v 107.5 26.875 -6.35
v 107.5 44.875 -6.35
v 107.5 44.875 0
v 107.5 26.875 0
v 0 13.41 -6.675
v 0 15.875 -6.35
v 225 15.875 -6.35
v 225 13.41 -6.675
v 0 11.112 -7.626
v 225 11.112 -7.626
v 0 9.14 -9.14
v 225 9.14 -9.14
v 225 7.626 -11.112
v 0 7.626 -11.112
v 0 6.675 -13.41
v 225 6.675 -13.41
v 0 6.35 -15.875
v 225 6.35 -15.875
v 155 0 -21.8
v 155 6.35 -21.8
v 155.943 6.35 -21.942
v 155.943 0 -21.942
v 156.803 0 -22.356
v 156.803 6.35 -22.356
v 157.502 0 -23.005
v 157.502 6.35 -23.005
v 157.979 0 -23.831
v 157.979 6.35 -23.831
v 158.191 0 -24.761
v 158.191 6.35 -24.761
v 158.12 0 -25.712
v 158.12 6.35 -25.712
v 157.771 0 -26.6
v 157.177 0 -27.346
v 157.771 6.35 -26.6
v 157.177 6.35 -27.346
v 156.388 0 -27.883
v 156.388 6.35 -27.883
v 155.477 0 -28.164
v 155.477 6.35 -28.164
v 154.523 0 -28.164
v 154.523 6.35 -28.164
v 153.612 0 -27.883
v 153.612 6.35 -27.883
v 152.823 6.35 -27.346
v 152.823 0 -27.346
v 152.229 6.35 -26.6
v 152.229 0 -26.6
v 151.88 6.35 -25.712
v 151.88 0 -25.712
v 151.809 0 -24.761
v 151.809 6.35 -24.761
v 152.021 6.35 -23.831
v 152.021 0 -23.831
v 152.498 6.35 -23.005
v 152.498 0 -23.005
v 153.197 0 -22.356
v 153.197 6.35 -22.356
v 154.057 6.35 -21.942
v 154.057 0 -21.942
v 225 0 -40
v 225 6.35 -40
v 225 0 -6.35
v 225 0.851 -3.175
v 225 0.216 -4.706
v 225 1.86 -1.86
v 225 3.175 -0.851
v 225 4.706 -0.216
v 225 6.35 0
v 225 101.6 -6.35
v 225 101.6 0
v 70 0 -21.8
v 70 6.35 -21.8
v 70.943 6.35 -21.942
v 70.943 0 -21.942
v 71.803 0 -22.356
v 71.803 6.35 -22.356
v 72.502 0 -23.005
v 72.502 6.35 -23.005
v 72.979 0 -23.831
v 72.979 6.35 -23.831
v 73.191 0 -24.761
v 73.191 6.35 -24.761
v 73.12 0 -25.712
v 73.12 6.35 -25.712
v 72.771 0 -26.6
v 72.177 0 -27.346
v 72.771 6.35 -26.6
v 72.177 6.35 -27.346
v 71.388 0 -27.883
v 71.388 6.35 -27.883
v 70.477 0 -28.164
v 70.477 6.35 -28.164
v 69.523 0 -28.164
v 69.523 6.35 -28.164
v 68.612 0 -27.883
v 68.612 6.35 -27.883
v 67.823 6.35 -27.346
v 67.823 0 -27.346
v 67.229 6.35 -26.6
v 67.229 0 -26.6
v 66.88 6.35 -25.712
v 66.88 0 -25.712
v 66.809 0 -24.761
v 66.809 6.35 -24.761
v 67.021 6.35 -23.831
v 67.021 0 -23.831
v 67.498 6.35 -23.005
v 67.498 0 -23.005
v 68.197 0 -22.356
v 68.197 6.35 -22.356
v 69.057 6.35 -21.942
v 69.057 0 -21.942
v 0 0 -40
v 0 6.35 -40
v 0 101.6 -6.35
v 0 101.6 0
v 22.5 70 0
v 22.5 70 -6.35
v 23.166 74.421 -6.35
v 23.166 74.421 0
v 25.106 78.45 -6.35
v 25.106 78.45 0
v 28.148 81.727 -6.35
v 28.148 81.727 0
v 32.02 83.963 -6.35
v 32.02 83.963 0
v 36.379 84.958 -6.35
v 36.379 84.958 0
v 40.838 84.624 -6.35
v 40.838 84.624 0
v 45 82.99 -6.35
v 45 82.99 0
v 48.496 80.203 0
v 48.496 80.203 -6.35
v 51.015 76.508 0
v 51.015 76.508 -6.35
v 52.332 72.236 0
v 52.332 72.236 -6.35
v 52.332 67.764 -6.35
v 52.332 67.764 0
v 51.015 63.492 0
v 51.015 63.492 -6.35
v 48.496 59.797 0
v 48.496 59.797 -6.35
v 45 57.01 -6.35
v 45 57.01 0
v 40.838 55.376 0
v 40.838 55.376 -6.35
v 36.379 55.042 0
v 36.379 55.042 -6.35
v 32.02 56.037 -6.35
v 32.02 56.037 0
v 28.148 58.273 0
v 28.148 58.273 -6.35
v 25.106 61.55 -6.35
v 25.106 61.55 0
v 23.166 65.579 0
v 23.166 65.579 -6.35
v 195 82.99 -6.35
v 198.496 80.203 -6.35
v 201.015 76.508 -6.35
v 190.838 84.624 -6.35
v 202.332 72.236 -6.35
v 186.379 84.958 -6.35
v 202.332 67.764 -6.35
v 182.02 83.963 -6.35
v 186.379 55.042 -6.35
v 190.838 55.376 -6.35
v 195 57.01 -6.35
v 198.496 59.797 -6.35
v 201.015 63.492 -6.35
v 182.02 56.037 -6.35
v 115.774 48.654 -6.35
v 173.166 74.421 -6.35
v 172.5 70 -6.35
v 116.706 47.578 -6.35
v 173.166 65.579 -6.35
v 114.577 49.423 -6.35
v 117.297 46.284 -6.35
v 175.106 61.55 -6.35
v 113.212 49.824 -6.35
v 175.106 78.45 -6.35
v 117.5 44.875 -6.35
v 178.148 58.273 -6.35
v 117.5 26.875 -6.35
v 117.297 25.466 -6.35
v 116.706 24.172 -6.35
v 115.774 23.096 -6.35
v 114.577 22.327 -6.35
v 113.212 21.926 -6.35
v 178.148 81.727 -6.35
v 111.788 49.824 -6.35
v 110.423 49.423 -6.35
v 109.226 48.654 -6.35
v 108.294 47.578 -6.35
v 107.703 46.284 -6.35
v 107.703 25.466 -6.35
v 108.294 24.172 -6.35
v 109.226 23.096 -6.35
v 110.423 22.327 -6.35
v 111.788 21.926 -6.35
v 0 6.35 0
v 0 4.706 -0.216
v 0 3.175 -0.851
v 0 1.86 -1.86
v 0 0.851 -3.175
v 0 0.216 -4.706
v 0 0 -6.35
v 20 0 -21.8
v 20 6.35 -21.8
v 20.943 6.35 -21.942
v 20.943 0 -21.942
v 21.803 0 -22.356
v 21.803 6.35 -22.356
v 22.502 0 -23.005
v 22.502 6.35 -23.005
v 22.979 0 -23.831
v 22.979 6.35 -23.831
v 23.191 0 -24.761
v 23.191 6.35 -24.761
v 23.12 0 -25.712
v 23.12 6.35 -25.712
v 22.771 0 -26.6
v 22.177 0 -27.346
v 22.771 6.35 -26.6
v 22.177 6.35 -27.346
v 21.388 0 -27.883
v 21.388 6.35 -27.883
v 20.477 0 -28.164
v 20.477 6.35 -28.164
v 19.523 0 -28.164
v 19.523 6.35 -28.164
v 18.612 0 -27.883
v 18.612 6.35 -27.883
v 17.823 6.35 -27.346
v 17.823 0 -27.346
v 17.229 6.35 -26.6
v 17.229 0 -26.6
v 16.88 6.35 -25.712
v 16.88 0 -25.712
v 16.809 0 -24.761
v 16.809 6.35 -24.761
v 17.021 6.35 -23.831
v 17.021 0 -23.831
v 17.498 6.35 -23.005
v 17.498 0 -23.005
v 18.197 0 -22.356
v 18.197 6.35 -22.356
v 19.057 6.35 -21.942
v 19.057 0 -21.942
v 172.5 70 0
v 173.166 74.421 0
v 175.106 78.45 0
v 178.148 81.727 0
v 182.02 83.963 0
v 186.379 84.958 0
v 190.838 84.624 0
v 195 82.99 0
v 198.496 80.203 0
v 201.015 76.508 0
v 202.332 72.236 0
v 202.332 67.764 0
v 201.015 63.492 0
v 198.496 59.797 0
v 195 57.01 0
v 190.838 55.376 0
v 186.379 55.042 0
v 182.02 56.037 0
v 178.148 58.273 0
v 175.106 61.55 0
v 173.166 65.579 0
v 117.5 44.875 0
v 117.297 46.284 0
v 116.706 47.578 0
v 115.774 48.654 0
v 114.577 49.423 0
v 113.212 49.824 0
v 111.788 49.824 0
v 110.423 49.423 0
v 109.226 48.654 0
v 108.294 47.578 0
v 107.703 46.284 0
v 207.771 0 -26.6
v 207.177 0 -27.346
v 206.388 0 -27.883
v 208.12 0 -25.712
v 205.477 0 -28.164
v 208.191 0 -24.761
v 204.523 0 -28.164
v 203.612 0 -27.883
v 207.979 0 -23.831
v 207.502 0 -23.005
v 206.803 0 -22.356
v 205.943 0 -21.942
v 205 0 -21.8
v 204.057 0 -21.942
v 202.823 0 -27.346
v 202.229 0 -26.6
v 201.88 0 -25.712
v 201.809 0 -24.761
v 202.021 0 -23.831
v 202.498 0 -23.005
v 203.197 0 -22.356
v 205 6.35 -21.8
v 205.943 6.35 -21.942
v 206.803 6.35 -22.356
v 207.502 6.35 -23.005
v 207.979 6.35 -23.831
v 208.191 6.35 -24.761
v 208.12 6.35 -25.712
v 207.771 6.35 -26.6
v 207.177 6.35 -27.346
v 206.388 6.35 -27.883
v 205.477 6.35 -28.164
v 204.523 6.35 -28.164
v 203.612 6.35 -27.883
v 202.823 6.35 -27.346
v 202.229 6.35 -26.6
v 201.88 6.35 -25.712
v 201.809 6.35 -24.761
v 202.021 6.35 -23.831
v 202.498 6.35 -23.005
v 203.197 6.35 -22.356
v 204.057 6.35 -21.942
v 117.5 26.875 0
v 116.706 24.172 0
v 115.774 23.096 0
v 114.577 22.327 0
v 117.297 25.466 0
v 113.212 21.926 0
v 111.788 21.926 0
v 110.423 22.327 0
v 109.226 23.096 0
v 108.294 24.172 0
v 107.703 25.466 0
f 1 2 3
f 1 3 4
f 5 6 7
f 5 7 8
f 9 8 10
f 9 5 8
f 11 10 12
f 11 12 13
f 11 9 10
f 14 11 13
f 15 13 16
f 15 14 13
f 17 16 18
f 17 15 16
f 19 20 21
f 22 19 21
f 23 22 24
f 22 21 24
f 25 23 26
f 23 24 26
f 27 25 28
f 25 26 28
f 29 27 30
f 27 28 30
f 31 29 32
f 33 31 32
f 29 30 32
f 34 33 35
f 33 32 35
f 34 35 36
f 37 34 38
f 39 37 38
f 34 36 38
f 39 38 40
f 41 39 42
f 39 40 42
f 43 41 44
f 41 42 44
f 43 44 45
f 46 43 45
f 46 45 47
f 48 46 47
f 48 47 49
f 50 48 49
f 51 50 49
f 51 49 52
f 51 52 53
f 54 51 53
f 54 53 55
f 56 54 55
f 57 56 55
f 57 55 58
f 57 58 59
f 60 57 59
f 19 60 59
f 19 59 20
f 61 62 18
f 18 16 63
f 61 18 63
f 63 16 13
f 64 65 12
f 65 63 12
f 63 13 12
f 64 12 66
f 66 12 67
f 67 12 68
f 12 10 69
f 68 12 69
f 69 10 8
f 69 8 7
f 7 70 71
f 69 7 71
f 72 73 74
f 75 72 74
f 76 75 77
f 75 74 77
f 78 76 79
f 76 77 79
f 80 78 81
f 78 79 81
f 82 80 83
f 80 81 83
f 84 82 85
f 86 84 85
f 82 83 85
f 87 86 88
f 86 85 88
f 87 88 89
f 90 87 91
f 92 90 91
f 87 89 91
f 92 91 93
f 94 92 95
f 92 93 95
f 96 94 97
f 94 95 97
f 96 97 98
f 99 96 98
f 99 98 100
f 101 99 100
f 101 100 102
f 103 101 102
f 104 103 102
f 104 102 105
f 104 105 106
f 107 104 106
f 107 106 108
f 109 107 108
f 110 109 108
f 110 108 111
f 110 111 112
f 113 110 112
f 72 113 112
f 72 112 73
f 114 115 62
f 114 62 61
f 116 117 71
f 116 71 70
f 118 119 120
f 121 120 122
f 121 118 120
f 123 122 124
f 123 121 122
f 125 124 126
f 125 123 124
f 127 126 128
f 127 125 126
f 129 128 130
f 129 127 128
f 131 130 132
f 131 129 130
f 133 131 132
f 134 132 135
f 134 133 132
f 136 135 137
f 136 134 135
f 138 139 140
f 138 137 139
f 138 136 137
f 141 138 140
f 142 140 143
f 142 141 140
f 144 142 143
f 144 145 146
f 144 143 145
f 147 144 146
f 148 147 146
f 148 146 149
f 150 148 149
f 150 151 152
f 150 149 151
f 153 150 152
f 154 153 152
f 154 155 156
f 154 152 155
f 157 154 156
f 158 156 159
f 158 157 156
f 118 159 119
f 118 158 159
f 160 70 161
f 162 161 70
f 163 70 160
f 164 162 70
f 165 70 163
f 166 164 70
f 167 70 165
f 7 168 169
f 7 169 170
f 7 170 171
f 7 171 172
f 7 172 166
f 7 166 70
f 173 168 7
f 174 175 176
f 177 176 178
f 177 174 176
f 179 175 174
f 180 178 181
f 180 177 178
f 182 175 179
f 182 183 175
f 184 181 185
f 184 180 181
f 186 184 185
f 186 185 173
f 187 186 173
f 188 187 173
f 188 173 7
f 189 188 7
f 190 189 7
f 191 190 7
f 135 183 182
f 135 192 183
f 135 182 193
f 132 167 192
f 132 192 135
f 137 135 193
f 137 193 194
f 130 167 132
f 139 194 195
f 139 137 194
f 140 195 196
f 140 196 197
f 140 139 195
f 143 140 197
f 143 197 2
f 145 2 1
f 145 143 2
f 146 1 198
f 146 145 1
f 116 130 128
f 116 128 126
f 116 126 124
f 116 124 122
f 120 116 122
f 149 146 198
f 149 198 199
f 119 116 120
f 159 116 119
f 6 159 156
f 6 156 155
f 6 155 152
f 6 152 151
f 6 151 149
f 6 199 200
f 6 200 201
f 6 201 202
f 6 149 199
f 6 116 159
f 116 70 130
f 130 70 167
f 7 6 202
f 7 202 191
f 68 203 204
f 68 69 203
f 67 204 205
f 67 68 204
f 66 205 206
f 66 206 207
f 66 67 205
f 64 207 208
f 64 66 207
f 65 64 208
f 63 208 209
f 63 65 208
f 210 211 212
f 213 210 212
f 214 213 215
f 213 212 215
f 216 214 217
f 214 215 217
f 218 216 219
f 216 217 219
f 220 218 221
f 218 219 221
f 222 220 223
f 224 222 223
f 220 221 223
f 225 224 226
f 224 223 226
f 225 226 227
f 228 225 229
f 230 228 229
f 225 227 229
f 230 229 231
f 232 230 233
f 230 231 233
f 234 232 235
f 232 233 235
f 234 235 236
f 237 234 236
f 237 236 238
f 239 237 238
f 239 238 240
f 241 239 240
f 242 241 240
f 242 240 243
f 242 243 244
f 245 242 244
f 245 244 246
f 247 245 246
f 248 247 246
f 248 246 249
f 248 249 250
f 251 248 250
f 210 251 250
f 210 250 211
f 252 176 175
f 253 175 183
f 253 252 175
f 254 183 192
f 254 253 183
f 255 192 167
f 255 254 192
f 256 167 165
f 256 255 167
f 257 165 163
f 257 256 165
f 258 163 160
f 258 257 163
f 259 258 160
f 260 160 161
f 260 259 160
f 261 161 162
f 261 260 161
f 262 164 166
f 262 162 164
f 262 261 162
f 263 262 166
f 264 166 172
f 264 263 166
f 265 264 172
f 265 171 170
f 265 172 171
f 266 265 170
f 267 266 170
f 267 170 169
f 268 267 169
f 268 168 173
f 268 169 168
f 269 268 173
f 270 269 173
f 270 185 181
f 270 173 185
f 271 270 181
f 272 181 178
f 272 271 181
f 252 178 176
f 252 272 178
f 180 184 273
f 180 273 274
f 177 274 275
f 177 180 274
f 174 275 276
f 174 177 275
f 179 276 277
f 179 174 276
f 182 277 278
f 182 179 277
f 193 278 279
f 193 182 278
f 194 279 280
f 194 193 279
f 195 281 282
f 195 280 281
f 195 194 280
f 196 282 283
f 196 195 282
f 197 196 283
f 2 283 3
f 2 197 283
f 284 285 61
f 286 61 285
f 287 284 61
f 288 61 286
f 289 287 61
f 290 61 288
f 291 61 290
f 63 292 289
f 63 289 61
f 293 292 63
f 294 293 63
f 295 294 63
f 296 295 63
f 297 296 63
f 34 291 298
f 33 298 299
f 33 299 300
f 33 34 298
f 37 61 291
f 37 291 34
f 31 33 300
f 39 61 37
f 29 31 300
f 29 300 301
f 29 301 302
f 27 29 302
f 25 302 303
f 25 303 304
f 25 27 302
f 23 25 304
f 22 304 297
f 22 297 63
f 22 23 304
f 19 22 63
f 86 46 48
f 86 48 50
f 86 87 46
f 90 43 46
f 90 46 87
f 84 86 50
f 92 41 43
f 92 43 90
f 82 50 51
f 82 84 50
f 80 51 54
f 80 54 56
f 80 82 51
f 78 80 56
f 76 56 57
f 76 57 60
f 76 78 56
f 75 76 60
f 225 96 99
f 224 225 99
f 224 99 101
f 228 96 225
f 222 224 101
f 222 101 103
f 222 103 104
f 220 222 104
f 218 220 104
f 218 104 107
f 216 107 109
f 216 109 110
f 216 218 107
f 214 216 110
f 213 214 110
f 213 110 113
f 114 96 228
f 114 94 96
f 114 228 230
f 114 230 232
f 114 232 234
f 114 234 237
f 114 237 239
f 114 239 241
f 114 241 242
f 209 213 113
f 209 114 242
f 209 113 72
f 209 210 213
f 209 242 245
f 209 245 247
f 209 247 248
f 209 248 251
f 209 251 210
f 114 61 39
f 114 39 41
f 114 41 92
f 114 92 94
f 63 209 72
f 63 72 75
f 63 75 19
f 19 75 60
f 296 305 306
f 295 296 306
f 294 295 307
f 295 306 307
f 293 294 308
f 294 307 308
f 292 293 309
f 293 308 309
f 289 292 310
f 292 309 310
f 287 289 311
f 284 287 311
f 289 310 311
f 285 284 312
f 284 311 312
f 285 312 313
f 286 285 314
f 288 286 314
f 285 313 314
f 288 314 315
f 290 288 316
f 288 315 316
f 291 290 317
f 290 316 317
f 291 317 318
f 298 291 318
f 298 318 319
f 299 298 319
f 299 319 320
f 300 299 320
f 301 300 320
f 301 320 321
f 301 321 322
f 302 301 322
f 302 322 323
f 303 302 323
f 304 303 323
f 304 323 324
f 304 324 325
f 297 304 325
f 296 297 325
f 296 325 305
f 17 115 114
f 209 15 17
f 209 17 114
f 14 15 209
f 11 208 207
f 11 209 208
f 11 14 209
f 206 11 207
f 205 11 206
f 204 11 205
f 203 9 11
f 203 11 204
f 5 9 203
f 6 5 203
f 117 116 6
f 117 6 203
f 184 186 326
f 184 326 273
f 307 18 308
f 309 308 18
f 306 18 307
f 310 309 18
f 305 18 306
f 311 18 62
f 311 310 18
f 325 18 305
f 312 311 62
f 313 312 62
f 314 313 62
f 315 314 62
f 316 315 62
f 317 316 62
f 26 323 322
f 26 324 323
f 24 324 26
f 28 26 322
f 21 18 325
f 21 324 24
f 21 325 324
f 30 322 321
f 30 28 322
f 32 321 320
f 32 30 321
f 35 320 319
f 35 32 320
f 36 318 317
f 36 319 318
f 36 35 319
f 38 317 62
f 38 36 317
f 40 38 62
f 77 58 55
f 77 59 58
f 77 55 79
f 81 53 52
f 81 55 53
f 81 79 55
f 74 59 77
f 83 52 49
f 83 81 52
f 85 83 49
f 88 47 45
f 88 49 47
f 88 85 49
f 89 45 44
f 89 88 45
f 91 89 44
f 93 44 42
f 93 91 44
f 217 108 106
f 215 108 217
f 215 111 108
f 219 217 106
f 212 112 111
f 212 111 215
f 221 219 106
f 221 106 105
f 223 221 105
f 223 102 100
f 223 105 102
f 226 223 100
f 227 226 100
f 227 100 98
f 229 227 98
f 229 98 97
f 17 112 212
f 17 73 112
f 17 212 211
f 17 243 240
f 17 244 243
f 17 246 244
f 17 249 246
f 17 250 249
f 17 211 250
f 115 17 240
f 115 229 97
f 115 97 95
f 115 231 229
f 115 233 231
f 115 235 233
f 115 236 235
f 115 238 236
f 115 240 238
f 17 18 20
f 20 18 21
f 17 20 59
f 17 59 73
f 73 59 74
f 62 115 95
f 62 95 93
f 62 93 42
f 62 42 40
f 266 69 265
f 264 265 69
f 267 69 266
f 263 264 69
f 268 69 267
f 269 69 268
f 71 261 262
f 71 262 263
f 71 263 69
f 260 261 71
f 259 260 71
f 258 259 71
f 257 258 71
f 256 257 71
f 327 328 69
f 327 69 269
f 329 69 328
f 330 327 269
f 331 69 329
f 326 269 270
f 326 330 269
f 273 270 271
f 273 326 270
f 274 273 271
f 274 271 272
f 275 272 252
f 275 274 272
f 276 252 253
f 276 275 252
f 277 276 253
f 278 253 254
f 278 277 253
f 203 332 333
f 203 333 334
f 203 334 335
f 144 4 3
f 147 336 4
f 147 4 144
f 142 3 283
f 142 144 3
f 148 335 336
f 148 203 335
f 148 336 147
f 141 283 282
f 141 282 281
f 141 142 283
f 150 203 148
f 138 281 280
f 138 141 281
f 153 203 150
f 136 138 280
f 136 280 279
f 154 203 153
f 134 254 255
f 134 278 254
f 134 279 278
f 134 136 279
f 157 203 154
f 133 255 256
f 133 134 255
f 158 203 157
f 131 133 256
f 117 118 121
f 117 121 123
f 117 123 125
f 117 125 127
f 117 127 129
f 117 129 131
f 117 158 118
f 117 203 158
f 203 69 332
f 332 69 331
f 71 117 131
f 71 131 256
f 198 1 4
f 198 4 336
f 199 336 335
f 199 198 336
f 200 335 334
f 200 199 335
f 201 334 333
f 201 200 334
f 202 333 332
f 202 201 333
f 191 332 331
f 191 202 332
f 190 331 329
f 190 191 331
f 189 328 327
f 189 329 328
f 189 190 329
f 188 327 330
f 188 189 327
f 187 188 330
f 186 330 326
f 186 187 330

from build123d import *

# Parameters (mm, degrees)
BOSS_EXTRUDE1_DEPTH  = 225
FILLET1_R            = 6.35
SKETCH2_R            = 15
CUT_EXTRUDE1_DEPTH   = 75
CUT_EXTRUDE2_DEPTH   = 10
M6_CLEARANCE_HOLE1_D = 6.4


with BuildPart() as part:
    # Sketch1 → Boss-Extrude1 (new body)
    with BuildSketch(Plane(origin=(0, 0, 0), x_dir=(0, 0, -1), z_dir=(1, 0, 0))):
        with BuildLine():
            Line((0, 0), (0, 101.6))
            Line((0, 101.6), (6.35, 101.6))
            Line((6.35, 101.6), (6.35, 15.875))
            ThreePointArc((6.35, 15.875), (9.139807909, 9.139807909), (15.875, 6.35))
            Line((15.875, 6.35), (40, 6.35))
            Line((40, 6.35), (40, 0))
            Line((40, 0), (0, 0))
        make_face()
    extrude(amount=BOSS_EXTRUDE1_DEPTH)

    # Fillet1
    fillet1_edges = [part.edges().sort_by_distance(p)[0] for p in [
        (112.5, 0, 0),
    ]]
    fillet(fillet1_edges, radius=FILLET1_R)

    # Sketch2 → Cut-Extrude1 (cut)
    with BuildSketch(Plane(origin=(0, 0, 0), x_dir=(-1, 0, 0), z_dir=(0, 0, -1))):
        with Locations((-37.5, 70)):
            Circle(SKETCH2_R)
        with Locations((-187.5, 70)):
            Circle(SKETCH2_R)
    extrude(amount=CUT_EXTRUDE1_DEPTH, mode=Mode.SUBTRACT)

    # Sketch5 → Cut-Extrude2 (cut)
    with BuildSketch(Plane(origin=(0, 0, -6.35), x_dir=(-1, 0, 0), z_dir=(0, 0, -1))):
        with BuildLine():
            Line((-107.5, 44.875), (-107.5, 26.875))
            ThreePointArc((-107.5, 26.875), (-112.5, 21.875), (-117.5, 26.875))
            Line((-117.5, 26.875), (-117.5, 44.875))
            ThreePointArc((-117.5, 44.875), (-112.5, 49.875), (-107.5, 44.875))
        make_face()
    extrude(amount=-CUT_EXTRUDE2_DEPTH, mode=Mode.SUBTRACT)

    # M6 Clearance Hole1 (through all)
    with Locations(Plane(origin=(20, 0, -25), x_dir=(0, 0, -1), z_dir=(0, -1, 0))):
        with Locations((0, 0), (0, 50), (0, 135), (0, 185)):
            Hole(M6_CLEARANCE_HOLE1_D / 2)


solid = part.part
